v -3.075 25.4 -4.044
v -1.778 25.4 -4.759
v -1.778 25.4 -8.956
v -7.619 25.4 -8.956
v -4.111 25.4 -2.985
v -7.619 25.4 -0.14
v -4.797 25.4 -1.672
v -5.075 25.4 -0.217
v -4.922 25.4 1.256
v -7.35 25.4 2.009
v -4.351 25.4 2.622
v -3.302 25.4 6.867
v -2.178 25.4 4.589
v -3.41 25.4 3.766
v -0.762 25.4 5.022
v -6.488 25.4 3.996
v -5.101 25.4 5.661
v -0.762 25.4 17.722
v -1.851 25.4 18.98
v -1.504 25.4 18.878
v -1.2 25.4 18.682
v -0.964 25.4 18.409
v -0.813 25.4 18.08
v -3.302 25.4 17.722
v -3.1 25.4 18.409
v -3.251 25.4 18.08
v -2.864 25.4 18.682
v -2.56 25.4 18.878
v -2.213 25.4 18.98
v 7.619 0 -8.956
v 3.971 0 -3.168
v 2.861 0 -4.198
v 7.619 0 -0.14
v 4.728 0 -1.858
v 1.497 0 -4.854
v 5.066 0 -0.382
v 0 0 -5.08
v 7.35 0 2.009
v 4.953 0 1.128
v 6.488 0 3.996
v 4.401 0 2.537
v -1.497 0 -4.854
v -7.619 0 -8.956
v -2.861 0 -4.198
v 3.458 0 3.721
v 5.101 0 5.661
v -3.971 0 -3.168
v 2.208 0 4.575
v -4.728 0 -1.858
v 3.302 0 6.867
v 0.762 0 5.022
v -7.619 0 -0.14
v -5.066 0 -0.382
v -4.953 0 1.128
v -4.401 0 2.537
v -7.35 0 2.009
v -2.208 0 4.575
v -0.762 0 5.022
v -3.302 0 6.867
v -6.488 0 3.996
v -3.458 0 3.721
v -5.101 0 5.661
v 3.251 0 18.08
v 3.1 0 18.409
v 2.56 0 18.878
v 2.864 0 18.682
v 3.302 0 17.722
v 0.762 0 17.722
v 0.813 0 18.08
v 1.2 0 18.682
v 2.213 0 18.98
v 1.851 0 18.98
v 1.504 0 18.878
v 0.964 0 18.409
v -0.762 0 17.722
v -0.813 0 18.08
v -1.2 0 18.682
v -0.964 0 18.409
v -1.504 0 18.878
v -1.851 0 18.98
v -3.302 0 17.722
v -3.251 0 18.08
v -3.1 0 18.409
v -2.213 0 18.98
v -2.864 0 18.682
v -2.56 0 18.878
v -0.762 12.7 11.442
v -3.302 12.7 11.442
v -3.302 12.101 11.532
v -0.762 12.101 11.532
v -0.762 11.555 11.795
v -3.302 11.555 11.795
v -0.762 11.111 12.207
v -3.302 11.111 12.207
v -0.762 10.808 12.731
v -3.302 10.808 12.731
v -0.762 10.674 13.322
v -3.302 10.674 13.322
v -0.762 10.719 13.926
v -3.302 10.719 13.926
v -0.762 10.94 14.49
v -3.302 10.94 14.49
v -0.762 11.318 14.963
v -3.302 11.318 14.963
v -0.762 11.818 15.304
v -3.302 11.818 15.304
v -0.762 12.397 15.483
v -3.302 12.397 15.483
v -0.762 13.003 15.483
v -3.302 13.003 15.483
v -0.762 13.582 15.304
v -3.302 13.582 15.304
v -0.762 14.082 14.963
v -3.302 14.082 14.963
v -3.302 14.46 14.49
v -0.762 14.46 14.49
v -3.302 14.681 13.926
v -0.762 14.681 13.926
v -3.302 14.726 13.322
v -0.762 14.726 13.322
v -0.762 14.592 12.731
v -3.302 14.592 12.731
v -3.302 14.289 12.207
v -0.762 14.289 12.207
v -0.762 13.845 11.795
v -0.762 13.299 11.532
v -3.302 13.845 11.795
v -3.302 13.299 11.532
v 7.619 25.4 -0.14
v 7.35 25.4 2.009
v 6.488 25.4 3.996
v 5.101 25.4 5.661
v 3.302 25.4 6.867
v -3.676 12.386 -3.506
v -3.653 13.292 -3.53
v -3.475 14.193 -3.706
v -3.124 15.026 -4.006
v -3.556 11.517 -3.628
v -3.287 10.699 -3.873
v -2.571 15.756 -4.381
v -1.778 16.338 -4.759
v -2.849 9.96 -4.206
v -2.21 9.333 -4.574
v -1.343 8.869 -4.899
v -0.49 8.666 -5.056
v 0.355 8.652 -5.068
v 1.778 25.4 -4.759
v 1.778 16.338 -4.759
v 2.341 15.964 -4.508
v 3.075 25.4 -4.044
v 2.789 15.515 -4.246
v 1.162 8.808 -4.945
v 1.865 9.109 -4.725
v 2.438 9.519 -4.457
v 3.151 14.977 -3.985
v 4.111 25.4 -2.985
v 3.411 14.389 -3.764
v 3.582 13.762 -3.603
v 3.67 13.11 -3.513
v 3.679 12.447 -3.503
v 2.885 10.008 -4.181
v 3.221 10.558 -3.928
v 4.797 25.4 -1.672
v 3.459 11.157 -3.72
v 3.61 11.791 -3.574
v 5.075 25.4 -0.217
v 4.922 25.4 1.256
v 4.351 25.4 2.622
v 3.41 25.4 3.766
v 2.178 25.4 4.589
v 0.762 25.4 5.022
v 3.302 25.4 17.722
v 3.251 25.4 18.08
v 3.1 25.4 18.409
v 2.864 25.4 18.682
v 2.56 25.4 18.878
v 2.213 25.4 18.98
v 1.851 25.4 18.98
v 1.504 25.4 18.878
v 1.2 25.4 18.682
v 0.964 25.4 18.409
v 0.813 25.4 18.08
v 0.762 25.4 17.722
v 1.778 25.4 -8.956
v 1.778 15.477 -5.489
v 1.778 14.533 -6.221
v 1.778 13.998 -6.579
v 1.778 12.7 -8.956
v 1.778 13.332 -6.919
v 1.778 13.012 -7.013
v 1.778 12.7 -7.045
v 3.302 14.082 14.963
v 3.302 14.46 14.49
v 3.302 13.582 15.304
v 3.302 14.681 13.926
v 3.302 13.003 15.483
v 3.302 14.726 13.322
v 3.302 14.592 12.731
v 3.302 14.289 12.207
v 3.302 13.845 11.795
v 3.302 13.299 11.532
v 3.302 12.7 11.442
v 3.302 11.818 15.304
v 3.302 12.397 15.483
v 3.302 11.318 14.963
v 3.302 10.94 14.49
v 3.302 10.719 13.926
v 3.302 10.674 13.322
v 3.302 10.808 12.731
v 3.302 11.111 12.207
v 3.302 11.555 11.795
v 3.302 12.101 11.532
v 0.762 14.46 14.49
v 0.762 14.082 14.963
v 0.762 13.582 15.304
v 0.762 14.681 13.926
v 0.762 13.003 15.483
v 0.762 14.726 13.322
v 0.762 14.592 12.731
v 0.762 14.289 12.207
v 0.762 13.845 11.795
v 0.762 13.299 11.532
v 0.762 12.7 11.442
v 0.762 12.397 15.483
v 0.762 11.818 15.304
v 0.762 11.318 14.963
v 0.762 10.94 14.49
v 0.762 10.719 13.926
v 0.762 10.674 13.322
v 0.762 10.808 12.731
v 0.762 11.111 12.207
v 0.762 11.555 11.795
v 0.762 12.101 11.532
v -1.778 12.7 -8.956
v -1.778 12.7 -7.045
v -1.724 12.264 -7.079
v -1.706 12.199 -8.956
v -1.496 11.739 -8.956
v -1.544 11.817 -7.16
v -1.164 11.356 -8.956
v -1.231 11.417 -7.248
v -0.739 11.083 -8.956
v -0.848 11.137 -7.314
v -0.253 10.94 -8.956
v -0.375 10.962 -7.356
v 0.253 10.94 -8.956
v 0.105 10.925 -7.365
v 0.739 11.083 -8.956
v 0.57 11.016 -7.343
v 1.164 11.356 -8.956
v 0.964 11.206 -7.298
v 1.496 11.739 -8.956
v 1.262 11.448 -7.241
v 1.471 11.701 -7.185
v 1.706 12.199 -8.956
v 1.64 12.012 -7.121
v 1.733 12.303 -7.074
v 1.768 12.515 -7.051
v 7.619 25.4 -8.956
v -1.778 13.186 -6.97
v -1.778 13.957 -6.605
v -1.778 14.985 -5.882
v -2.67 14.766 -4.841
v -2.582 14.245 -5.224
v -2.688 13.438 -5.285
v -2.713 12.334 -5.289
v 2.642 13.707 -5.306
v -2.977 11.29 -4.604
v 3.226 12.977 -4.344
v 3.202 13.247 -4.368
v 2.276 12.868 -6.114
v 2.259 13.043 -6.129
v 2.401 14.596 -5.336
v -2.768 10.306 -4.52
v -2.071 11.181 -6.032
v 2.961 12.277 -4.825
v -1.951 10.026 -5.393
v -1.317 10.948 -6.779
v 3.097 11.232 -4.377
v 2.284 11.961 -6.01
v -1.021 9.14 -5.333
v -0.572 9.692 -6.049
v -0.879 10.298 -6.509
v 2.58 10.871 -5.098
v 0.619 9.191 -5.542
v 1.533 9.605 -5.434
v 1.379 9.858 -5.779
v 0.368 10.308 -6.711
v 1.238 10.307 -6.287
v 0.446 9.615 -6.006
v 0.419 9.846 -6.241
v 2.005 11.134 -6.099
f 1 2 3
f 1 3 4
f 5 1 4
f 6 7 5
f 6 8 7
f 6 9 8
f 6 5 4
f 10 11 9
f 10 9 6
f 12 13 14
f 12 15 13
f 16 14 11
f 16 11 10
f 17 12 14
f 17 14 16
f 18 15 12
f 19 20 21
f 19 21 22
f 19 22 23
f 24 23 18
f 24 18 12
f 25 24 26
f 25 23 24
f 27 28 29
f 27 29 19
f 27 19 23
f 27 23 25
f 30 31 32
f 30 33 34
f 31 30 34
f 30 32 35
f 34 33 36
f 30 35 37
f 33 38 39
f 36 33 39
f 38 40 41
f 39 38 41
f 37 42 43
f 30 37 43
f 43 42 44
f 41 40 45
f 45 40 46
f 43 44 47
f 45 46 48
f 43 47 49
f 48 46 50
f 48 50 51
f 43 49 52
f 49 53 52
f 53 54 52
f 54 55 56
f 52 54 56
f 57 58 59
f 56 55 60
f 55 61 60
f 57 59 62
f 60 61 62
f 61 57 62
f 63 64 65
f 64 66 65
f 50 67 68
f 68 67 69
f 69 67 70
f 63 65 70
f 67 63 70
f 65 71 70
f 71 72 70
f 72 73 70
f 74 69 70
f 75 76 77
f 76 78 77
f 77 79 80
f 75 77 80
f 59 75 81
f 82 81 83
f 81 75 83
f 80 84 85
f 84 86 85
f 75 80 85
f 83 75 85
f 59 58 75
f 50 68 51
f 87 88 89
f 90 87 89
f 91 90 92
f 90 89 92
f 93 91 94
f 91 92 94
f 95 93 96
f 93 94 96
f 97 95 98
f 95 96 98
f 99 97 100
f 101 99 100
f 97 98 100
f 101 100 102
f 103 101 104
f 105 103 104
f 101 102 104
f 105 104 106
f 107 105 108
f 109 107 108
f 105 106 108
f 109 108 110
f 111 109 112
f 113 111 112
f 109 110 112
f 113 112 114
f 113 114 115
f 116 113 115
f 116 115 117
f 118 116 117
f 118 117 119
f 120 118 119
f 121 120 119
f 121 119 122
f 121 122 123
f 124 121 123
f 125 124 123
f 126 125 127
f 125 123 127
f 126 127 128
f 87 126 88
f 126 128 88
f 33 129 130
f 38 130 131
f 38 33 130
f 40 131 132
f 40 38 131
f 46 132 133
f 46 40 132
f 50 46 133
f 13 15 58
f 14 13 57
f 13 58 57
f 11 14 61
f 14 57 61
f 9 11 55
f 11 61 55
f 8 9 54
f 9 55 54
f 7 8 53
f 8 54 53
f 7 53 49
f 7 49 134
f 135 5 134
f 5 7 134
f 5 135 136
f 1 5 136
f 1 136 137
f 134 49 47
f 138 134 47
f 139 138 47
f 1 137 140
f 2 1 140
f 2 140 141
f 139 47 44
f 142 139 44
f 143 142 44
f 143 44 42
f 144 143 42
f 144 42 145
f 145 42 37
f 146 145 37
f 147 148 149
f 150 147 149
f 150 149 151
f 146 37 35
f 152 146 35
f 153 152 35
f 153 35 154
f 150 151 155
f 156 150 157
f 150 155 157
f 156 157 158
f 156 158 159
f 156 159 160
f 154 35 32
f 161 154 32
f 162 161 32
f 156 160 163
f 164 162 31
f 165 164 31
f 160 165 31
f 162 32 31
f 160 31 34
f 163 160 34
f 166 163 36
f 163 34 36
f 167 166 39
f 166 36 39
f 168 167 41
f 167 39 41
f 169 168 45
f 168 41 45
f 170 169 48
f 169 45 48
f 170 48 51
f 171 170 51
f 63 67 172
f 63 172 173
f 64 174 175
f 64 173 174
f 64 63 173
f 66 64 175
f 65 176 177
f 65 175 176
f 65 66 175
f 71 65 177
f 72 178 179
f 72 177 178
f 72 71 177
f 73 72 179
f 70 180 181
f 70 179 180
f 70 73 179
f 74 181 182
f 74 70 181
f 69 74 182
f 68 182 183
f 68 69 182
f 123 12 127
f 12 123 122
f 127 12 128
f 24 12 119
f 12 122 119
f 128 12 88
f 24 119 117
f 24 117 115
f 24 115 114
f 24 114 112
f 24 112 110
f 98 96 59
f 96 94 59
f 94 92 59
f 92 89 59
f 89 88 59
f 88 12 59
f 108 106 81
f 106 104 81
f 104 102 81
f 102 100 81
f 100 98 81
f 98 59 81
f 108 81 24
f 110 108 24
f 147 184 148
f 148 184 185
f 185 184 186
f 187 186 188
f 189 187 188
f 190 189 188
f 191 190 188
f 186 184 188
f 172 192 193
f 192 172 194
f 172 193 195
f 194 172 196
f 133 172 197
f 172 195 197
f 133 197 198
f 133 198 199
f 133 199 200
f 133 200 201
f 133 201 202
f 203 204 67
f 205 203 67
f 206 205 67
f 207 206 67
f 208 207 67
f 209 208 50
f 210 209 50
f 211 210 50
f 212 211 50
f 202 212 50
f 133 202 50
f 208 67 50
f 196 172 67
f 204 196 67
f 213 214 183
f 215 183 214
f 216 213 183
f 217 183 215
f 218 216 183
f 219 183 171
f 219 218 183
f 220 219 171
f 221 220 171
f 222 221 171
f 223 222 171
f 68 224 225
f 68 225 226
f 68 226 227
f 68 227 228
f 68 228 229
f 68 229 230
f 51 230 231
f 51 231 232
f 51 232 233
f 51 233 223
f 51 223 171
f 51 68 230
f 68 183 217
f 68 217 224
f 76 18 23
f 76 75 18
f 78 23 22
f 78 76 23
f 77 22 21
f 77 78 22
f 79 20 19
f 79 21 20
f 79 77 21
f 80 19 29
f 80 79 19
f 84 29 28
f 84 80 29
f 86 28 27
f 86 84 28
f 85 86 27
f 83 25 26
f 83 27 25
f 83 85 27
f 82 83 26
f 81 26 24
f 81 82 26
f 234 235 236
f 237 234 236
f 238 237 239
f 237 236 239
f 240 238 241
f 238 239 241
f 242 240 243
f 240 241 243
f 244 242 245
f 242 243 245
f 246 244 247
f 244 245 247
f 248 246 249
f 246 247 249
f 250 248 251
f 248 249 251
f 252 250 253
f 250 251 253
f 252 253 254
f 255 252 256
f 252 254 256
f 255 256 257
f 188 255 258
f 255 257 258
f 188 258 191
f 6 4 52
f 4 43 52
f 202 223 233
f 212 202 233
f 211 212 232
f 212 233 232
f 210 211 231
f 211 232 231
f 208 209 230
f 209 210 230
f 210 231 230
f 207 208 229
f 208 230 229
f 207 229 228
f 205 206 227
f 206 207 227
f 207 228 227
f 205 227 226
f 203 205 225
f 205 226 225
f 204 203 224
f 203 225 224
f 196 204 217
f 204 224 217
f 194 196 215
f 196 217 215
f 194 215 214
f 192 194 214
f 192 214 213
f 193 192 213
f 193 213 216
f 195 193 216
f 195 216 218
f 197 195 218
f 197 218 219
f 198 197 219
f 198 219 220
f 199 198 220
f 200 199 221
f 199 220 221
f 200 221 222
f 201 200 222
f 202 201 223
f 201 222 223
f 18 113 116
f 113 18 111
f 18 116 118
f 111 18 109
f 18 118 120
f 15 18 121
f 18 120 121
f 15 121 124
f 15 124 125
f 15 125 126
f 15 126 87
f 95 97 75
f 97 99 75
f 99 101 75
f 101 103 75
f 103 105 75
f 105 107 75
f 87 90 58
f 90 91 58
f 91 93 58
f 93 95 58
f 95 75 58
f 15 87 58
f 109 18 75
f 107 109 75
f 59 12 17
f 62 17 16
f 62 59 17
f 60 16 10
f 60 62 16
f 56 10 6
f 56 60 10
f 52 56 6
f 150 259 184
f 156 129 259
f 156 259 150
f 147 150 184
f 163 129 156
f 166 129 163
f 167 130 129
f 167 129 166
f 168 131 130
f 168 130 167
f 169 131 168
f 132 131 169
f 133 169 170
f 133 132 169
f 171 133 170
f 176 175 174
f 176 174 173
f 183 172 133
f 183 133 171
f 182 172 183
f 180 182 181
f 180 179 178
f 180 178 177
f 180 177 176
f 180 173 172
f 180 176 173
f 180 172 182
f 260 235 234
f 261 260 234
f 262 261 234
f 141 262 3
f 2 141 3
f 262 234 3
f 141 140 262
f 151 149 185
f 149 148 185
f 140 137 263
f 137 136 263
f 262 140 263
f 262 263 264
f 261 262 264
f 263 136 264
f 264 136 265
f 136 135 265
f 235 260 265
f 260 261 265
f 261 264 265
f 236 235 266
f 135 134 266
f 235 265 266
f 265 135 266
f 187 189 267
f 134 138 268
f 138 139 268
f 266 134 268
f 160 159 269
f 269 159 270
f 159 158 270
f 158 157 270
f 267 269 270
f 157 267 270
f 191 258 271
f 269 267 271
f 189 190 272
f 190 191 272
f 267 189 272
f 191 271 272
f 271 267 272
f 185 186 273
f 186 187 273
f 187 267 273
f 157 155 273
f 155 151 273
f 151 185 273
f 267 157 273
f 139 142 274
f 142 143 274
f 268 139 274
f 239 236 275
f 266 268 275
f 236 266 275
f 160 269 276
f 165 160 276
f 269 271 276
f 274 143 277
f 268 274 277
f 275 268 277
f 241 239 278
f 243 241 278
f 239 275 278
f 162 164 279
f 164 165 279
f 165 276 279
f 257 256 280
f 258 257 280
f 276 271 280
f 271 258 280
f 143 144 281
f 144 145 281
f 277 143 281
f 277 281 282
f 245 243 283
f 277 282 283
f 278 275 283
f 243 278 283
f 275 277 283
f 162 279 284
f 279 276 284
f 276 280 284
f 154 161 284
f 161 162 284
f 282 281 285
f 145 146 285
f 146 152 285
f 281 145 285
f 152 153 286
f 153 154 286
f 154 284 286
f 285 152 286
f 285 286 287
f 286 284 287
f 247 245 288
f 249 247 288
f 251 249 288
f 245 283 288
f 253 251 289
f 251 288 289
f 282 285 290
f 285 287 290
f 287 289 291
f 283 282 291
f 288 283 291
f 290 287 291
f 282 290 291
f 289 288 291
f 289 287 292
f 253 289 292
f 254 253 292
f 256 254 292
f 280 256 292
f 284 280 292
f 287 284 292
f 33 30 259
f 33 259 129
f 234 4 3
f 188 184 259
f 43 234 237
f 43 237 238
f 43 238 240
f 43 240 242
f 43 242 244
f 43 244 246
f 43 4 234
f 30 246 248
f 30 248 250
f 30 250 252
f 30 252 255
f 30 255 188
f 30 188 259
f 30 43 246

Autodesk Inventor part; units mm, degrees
ref_plane "YZ Plane" through (0, 0, 0) normal (1, 0, 0) x (0, 1, 0)
ref_plane "XZ Plane" through (0, 0, 0) normal (0, 1, 0) x (-1, 0, 0)
ref_plane "XY Plane" through (0, 0, 0) normal (0, 0, 1) x (1, 0, 0)
sketch "Sketch1" plane through (0, 0, 0) normal (0, 1, 0) x (-1, 0, 0)
  line L0 (-0.762, 12.7) -> (-0.762, 17.7225)
  line L1 (0.762, 12.7) -> (0.762, 17.7225)
  line L2 (-3.302, 12.7) -> (-3.302, 17.7225)
  line L3 (3.302, 12.7) -> (3.302, 17.7225)
  line L4 (3.302, 12.7) -> (3.302, 6.8674)
  line L5 (-3.302, 12.7) -> (-3.302, 6.8674)
  line L6 (-2.032, 18.9925) -> (-2.032, 18.9925)
  line L7 (2.032, 18.9925) -> (2.032, 18.9925)
  arc A0 (3.302, 17.7225) -> (2.032, 18.9925) centre (2.032, 17.7225) ccw
  arc A1 (2.032, 18.9925) -> (0.762, 17.7225) centre (2.032, 17.7225) ccw
  arc A2 (-0.762, 17.7225) -> (-2.032, 18.9925) centre (-2.032, 17.7225) ccw
  arc A3 (-2.032, 18.9925) -> (-3.302, 17.7225) centre (-2.032, 17.7225) ccw
  arc A4 (-0.762, 5.0225) -> (0.762, 5.0225) centre (0, 0) ccw
  line L8 (0.762, 12.7) -> (0.762, 5.0225)
  line L9 (-0.762, 12.7) -> (-0.762, 5.0225)
  arc A5 (-3.302, 6.8674) -> (-7.6187, -0.1405) centre (0, 0) ccw
  arc A6 (7.6187, -0.1405) -> (3.302, 6.8674) centre (0, 0) ccw
  line L10 (7.6187, -8.9561) -> (-7.6187, -8.9561)
  line L11 (7.6187, -8.9561) -> (7.6187, 0.1405)
  line L12 (-7.6187, -8.9561) -> (-7.6187, 0.1405)
  dimension "d3" = 2.54
  dimension "d4" = 2.54
  dimension "d5" = 1.27
  dimension "d6" = 10.16
  dimension "d7" = 1.524
  dimension "d8" = 1.524
  dimension "d9" = 12.7
  dimension "d10" = 12.7
extrude "Extrusion1" add sketch "Sketch1" along normal blind 25.4
sketch "Sketch3" plane through (3.302, 0, 17.7225) normal (1, 0, 0) x (0, 0, -1)
  line L0 (0, 25.4) -> (10.8551, 25.4) projected
  point P0 (17.7225, 0)
  point P1 (4.2489, 12.7)
  dimension "d24" = 12.7
hole "Hole2" at (3.302, 12.7, 13.4736) direction (-1, 0, 0) diameter 4.064 end through all
sketch "Sketch5" plane through (7.6187, 0, -8.9561) normal (0, 0, -1) x (-1, 0, 0)
  line L0 (2.5387, 0) -> (12.6987, 0) projected
  point P0 (7.6187, 0)
  point P1 (7.6187, 12.7)
  point P2 (8.3807, 0)
  point P3 (6.8567, 0)
  dimension "d34" = 12.7
hole "Hole3" at (0, 12.7, -8.9561) direction (0, 0, 1) diameter 3.556 depth 4.7625 tip angle 118
chamfer "Chamfer2" distance 2.286 angle 45 1 edges at (-0.0006, 10.922, -5.08)
sketch "Sketch6" plane through (7.6187, 0, -8.9561) normal (0, 0, -1) x (-1, 0, 0)
  circle A0 centre (7.6187, 12.7) radius 1.778 projected
  line L0 (5.8407, 12.7) -> (9.3967, 12.7)
  line L1 (9.3967, 12.7) -> (9.3967, 25.4084)
  line L2 (9.3967, 25.4084) -> (5.8407, 25.4084)
  line L3 (5.8407, 25.4084) -> (5.8407, 12.7)
  point P0 (7.6187, 0)
extrude "Extrusion2" cut sketch "Sketch6" against normal blind 6.35 contours L0 A0 | A0 L3 L2 L1 picked at (8.0623, 13.093)
equation "\"d10\" = d9"
properties part number "pen holder 3" material "PBT Plastic"
